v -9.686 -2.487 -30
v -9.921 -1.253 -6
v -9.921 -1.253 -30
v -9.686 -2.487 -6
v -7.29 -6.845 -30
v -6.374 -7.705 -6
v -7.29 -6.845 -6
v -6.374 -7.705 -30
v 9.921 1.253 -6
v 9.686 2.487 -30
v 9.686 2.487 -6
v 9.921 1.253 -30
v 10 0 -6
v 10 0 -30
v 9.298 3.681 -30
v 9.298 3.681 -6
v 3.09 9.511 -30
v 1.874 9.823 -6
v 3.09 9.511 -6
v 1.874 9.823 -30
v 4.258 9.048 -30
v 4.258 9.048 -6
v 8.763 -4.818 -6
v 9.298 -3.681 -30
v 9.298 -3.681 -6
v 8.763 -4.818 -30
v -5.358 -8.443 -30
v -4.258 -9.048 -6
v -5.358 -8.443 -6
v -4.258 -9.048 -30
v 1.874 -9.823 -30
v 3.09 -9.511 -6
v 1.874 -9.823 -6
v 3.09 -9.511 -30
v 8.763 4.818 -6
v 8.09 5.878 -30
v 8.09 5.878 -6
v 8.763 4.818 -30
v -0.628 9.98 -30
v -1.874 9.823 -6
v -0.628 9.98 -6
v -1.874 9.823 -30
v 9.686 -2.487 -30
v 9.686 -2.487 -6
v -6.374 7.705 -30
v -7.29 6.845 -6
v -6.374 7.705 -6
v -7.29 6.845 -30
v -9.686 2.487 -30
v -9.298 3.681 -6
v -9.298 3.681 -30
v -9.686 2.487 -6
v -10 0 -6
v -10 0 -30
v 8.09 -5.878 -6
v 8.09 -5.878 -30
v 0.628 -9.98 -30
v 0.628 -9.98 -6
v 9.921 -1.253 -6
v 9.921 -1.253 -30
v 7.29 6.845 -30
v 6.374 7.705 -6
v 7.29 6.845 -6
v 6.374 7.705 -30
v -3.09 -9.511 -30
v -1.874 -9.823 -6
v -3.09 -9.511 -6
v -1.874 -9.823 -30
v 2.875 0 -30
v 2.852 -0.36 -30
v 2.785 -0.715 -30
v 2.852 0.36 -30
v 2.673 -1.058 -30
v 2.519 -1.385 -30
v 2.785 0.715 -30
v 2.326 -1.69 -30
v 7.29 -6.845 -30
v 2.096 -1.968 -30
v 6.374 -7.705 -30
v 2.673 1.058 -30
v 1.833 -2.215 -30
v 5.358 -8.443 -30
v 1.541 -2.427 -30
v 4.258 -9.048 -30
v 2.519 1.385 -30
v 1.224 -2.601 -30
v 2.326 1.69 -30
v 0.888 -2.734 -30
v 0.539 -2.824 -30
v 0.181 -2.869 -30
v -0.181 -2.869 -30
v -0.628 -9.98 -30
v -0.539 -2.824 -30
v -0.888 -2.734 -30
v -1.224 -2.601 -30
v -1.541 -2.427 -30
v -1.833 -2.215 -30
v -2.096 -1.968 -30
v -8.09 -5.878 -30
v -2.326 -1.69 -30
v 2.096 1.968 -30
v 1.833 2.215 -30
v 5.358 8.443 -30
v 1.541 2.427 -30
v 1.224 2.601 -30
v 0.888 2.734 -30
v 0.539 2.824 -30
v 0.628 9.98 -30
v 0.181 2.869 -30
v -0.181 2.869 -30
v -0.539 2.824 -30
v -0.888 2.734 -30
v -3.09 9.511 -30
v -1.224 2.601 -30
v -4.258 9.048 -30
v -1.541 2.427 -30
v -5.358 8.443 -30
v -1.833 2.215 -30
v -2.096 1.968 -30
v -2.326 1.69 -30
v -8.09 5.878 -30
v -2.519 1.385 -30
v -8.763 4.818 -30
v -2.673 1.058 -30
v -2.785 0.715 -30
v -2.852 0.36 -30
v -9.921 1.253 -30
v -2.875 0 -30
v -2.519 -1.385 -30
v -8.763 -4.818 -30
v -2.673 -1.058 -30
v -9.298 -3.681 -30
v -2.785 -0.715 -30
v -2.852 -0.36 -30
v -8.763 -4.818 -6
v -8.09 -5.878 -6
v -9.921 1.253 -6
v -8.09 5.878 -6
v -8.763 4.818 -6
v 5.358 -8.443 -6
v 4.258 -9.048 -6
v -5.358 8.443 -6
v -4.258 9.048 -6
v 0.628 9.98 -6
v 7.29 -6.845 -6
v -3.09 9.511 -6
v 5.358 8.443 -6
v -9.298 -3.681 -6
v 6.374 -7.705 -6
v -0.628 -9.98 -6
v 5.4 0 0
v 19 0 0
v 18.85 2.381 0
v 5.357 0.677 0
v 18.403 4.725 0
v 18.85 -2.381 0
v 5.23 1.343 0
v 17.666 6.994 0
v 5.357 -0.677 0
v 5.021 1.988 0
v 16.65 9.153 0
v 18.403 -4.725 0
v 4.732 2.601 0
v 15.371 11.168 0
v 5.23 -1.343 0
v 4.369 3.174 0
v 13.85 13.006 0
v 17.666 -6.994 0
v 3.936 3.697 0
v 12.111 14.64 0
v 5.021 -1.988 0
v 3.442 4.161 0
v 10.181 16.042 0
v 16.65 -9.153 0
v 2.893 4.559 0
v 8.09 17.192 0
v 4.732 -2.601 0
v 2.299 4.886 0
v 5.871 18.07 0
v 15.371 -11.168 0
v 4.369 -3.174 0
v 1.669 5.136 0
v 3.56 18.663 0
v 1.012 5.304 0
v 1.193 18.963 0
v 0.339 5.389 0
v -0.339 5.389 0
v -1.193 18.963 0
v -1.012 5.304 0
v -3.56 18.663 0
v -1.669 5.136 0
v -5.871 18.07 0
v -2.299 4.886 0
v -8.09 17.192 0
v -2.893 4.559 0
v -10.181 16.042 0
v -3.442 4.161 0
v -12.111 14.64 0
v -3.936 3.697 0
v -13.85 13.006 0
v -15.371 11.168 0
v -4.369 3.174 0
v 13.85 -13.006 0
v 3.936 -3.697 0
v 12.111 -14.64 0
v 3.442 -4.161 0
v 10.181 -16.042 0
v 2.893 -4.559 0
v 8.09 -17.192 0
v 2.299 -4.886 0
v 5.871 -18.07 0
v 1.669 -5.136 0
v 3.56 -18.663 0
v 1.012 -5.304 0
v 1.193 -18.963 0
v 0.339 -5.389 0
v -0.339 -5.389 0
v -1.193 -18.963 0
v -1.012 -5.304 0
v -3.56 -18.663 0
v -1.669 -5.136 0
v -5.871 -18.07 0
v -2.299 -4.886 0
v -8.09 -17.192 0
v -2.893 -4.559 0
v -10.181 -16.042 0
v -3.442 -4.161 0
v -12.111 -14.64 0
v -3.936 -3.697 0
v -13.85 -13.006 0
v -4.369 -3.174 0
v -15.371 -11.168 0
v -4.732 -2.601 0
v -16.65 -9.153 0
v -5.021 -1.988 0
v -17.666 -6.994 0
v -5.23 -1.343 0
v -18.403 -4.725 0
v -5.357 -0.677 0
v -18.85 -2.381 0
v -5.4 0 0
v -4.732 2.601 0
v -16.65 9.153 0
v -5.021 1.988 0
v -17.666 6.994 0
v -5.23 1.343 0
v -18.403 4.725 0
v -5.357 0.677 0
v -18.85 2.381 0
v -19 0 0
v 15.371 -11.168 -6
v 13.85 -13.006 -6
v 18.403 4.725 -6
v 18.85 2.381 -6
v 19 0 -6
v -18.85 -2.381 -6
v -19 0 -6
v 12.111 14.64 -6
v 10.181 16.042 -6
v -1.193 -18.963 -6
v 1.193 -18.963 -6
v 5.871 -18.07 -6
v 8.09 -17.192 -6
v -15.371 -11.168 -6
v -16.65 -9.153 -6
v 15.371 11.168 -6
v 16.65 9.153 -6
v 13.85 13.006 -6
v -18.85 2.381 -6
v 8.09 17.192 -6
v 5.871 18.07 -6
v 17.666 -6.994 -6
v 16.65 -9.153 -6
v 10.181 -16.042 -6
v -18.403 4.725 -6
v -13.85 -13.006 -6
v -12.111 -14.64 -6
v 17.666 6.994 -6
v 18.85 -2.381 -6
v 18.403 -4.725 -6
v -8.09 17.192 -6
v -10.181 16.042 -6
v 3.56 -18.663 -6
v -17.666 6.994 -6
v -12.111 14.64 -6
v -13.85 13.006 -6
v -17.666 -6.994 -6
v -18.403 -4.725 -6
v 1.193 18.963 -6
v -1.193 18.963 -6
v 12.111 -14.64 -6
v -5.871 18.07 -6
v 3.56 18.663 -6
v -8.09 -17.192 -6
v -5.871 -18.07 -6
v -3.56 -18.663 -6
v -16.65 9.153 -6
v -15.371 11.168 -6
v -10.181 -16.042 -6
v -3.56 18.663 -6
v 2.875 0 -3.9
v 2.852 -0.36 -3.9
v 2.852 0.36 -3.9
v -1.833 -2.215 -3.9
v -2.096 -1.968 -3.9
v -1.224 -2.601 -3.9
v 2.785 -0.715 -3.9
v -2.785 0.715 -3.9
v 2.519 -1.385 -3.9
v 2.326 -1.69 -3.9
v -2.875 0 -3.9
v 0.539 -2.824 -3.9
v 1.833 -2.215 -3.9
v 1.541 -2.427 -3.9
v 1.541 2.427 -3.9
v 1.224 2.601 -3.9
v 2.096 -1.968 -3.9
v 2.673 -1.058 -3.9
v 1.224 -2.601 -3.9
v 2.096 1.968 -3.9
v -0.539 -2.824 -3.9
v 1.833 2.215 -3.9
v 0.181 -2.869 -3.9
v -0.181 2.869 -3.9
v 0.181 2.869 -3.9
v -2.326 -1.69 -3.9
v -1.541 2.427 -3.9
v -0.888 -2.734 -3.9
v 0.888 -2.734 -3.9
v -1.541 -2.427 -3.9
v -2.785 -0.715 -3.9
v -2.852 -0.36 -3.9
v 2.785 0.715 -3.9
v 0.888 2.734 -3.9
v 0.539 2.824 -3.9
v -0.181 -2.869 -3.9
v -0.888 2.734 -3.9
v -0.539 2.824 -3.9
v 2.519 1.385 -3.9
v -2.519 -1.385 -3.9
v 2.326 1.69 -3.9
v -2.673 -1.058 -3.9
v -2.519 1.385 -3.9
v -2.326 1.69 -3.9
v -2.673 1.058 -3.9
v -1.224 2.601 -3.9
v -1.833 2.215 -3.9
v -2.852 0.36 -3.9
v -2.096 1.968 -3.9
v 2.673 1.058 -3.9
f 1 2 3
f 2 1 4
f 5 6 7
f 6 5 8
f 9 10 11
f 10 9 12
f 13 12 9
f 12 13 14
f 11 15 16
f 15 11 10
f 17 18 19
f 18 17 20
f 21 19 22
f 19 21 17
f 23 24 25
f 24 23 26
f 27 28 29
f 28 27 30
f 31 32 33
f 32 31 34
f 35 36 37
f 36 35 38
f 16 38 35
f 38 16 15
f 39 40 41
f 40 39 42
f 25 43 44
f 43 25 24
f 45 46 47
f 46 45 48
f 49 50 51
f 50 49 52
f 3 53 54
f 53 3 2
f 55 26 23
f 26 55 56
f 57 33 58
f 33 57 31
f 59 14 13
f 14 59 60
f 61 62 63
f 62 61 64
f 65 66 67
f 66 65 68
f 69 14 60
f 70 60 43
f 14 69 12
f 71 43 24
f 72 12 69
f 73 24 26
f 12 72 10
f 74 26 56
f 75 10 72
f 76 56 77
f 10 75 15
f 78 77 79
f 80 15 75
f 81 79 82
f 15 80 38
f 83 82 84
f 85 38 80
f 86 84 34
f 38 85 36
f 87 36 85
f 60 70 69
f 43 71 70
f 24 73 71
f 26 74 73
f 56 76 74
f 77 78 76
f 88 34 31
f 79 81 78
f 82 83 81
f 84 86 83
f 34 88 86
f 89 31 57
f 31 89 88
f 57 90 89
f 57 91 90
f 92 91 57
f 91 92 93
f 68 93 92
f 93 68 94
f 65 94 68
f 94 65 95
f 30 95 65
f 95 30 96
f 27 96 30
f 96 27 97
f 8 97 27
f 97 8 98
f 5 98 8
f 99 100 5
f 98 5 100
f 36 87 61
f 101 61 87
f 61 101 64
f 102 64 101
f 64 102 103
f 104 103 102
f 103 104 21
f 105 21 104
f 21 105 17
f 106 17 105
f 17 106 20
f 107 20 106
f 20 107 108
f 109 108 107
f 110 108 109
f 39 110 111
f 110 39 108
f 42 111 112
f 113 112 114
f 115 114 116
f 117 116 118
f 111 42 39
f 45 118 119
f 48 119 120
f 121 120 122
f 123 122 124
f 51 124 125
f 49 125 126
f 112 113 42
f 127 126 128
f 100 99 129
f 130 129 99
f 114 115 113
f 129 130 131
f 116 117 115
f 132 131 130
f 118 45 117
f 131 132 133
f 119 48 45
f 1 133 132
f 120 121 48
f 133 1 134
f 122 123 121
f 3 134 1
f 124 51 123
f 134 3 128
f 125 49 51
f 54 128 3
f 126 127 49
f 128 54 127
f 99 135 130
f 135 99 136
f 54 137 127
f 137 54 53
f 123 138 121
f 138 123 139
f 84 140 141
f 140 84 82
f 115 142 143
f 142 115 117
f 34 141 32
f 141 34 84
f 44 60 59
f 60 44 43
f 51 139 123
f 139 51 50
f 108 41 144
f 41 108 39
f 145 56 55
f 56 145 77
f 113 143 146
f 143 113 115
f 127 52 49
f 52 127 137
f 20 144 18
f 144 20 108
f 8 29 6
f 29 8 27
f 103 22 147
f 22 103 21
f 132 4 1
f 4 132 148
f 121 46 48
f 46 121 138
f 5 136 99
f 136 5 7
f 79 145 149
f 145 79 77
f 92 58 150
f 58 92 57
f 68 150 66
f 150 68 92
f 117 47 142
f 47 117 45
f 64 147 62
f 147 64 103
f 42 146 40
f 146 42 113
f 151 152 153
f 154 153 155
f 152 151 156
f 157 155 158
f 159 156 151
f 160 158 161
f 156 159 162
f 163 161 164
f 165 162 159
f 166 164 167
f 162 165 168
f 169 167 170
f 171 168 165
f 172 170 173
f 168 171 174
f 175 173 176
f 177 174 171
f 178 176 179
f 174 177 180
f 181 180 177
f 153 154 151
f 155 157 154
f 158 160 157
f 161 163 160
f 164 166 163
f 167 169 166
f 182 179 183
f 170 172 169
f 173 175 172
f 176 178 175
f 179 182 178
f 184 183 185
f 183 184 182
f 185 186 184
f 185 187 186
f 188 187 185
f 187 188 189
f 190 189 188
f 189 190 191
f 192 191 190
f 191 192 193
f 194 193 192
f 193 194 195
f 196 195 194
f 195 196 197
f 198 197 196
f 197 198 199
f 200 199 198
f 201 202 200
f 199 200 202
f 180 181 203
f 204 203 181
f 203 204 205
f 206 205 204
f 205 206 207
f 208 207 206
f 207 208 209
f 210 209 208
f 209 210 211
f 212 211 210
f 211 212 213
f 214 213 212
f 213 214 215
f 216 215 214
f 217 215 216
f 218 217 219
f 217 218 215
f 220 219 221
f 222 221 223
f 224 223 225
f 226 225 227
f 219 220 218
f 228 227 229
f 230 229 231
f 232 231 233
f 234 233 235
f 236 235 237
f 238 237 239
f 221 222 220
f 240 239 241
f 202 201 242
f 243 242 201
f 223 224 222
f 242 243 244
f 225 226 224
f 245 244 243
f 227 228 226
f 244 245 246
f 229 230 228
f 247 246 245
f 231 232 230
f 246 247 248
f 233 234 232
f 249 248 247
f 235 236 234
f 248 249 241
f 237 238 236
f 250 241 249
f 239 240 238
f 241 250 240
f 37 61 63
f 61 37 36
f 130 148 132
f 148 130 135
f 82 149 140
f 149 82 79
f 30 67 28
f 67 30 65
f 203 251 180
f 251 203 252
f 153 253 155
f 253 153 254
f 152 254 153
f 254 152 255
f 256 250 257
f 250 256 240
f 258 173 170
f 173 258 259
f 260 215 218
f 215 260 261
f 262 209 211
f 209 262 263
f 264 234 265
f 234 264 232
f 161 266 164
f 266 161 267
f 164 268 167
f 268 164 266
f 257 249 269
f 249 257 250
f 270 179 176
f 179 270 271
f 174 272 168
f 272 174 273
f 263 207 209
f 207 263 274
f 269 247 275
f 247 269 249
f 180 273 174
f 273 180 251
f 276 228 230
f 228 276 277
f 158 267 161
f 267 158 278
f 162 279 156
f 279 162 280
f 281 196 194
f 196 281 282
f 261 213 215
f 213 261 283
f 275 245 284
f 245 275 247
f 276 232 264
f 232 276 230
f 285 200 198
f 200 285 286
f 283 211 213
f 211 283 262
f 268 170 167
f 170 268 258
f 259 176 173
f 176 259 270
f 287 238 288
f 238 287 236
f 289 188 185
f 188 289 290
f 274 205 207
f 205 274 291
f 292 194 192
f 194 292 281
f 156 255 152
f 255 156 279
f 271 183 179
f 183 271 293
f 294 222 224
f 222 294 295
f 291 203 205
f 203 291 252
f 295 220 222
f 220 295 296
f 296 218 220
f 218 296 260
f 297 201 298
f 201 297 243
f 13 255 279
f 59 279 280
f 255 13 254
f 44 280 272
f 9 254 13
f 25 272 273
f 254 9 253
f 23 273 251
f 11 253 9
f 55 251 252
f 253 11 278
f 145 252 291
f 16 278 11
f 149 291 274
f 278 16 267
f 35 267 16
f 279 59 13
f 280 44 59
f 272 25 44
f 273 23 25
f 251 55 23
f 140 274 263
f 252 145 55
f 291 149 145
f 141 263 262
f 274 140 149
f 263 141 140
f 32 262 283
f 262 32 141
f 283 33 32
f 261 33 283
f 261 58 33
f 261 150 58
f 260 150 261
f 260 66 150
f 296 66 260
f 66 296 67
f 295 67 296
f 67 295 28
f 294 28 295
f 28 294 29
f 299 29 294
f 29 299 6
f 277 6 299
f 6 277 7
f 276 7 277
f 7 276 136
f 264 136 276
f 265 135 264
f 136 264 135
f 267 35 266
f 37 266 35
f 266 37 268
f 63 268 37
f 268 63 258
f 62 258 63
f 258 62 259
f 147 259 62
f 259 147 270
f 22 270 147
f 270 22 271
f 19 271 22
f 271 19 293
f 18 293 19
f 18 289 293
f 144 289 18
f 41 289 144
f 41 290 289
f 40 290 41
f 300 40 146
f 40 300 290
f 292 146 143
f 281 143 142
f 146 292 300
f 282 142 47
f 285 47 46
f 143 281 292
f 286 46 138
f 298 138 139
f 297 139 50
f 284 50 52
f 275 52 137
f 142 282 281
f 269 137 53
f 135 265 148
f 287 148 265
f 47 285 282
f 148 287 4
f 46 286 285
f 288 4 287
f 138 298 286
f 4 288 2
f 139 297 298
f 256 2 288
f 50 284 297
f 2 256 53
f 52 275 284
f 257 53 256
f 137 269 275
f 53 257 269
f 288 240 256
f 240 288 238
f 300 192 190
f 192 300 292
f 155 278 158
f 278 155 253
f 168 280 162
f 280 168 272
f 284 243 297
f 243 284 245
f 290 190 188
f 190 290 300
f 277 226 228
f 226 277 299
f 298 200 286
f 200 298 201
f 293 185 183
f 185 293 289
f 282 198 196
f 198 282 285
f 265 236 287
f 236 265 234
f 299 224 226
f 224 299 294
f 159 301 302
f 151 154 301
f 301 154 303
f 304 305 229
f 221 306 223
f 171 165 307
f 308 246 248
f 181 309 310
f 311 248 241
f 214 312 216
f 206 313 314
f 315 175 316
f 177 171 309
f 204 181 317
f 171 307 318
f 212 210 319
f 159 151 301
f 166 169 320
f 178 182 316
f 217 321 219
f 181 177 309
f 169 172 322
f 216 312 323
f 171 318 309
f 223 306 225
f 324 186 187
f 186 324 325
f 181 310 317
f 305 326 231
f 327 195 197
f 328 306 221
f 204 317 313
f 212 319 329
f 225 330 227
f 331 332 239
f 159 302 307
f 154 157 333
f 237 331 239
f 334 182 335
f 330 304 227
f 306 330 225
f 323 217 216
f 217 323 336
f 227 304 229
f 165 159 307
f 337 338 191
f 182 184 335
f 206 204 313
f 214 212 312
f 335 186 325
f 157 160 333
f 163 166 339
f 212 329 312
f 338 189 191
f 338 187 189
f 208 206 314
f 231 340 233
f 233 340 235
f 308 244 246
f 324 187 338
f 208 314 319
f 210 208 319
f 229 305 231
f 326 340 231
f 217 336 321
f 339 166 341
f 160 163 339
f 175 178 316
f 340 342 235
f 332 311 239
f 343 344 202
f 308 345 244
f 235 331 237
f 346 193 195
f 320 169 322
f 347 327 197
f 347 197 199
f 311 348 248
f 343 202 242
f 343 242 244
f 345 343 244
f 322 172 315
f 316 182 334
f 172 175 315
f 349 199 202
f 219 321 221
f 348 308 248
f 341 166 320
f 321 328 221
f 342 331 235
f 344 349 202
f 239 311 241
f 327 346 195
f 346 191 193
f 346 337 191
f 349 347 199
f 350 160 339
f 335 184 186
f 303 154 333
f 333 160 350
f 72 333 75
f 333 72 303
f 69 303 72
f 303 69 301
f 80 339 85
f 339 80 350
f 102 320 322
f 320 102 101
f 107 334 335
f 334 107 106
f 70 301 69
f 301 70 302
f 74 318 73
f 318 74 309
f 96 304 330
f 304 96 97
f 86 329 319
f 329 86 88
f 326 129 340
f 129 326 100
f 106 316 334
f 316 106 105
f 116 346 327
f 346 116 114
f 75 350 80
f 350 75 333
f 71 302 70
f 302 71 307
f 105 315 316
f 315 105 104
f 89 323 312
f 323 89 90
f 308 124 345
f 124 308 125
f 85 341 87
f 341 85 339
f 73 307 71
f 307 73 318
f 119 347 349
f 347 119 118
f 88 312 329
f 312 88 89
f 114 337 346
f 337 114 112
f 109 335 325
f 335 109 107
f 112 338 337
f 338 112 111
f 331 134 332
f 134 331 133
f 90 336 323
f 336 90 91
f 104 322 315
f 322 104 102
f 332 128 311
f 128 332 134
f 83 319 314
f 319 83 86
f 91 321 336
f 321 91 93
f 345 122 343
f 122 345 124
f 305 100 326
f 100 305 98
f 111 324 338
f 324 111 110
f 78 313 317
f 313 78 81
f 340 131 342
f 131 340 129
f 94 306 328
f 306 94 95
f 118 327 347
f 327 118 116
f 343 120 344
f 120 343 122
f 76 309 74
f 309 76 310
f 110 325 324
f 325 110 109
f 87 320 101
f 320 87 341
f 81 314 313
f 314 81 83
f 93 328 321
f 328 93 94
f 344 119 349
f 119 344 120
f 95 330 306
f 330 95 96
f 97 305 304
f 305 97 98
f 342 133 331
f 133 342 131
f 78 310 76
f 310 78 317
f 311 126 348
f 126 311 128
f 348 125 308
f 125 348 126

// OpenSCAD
$fn = 50;


difference() {
	union() {
		translate(v = [0, 0, -30.0000000000]) {
			cylinder(h = 30, r = 10.0000000000);
		}
		translate(v = [0, 0, -6.0000000000]) {
			cylinder(h = 6, r = 19.0000000000);
		}
	}
	union() {
		translate(v = [0, 0, 0]) {
			rotate(a = [0, 0, 0]) {
				difference() {
					union() {
						#translate(v = [0, 0, -30.0000000000]) {
							cylinder(h = 30, r = 2.6000000000);
						}
						#translate(v = [0, 0, -3.9000000000]) {
							cylinder(h = 3.9000000000, r = 10.0000000000, r1 = 2.8750000000, r2 = 5.4000000000);
						}
						#translate(v = [0, 0, -30.0000000000]) {
							cylinder(h = 30, r = 2.8750000000);
						}
						#translate(v = [0, 0, -30.0000000000]) {
							cylinder(h = 30, r = 2.6000000000);
						}
					}
					union();
				}
			}
		}
	}
}
